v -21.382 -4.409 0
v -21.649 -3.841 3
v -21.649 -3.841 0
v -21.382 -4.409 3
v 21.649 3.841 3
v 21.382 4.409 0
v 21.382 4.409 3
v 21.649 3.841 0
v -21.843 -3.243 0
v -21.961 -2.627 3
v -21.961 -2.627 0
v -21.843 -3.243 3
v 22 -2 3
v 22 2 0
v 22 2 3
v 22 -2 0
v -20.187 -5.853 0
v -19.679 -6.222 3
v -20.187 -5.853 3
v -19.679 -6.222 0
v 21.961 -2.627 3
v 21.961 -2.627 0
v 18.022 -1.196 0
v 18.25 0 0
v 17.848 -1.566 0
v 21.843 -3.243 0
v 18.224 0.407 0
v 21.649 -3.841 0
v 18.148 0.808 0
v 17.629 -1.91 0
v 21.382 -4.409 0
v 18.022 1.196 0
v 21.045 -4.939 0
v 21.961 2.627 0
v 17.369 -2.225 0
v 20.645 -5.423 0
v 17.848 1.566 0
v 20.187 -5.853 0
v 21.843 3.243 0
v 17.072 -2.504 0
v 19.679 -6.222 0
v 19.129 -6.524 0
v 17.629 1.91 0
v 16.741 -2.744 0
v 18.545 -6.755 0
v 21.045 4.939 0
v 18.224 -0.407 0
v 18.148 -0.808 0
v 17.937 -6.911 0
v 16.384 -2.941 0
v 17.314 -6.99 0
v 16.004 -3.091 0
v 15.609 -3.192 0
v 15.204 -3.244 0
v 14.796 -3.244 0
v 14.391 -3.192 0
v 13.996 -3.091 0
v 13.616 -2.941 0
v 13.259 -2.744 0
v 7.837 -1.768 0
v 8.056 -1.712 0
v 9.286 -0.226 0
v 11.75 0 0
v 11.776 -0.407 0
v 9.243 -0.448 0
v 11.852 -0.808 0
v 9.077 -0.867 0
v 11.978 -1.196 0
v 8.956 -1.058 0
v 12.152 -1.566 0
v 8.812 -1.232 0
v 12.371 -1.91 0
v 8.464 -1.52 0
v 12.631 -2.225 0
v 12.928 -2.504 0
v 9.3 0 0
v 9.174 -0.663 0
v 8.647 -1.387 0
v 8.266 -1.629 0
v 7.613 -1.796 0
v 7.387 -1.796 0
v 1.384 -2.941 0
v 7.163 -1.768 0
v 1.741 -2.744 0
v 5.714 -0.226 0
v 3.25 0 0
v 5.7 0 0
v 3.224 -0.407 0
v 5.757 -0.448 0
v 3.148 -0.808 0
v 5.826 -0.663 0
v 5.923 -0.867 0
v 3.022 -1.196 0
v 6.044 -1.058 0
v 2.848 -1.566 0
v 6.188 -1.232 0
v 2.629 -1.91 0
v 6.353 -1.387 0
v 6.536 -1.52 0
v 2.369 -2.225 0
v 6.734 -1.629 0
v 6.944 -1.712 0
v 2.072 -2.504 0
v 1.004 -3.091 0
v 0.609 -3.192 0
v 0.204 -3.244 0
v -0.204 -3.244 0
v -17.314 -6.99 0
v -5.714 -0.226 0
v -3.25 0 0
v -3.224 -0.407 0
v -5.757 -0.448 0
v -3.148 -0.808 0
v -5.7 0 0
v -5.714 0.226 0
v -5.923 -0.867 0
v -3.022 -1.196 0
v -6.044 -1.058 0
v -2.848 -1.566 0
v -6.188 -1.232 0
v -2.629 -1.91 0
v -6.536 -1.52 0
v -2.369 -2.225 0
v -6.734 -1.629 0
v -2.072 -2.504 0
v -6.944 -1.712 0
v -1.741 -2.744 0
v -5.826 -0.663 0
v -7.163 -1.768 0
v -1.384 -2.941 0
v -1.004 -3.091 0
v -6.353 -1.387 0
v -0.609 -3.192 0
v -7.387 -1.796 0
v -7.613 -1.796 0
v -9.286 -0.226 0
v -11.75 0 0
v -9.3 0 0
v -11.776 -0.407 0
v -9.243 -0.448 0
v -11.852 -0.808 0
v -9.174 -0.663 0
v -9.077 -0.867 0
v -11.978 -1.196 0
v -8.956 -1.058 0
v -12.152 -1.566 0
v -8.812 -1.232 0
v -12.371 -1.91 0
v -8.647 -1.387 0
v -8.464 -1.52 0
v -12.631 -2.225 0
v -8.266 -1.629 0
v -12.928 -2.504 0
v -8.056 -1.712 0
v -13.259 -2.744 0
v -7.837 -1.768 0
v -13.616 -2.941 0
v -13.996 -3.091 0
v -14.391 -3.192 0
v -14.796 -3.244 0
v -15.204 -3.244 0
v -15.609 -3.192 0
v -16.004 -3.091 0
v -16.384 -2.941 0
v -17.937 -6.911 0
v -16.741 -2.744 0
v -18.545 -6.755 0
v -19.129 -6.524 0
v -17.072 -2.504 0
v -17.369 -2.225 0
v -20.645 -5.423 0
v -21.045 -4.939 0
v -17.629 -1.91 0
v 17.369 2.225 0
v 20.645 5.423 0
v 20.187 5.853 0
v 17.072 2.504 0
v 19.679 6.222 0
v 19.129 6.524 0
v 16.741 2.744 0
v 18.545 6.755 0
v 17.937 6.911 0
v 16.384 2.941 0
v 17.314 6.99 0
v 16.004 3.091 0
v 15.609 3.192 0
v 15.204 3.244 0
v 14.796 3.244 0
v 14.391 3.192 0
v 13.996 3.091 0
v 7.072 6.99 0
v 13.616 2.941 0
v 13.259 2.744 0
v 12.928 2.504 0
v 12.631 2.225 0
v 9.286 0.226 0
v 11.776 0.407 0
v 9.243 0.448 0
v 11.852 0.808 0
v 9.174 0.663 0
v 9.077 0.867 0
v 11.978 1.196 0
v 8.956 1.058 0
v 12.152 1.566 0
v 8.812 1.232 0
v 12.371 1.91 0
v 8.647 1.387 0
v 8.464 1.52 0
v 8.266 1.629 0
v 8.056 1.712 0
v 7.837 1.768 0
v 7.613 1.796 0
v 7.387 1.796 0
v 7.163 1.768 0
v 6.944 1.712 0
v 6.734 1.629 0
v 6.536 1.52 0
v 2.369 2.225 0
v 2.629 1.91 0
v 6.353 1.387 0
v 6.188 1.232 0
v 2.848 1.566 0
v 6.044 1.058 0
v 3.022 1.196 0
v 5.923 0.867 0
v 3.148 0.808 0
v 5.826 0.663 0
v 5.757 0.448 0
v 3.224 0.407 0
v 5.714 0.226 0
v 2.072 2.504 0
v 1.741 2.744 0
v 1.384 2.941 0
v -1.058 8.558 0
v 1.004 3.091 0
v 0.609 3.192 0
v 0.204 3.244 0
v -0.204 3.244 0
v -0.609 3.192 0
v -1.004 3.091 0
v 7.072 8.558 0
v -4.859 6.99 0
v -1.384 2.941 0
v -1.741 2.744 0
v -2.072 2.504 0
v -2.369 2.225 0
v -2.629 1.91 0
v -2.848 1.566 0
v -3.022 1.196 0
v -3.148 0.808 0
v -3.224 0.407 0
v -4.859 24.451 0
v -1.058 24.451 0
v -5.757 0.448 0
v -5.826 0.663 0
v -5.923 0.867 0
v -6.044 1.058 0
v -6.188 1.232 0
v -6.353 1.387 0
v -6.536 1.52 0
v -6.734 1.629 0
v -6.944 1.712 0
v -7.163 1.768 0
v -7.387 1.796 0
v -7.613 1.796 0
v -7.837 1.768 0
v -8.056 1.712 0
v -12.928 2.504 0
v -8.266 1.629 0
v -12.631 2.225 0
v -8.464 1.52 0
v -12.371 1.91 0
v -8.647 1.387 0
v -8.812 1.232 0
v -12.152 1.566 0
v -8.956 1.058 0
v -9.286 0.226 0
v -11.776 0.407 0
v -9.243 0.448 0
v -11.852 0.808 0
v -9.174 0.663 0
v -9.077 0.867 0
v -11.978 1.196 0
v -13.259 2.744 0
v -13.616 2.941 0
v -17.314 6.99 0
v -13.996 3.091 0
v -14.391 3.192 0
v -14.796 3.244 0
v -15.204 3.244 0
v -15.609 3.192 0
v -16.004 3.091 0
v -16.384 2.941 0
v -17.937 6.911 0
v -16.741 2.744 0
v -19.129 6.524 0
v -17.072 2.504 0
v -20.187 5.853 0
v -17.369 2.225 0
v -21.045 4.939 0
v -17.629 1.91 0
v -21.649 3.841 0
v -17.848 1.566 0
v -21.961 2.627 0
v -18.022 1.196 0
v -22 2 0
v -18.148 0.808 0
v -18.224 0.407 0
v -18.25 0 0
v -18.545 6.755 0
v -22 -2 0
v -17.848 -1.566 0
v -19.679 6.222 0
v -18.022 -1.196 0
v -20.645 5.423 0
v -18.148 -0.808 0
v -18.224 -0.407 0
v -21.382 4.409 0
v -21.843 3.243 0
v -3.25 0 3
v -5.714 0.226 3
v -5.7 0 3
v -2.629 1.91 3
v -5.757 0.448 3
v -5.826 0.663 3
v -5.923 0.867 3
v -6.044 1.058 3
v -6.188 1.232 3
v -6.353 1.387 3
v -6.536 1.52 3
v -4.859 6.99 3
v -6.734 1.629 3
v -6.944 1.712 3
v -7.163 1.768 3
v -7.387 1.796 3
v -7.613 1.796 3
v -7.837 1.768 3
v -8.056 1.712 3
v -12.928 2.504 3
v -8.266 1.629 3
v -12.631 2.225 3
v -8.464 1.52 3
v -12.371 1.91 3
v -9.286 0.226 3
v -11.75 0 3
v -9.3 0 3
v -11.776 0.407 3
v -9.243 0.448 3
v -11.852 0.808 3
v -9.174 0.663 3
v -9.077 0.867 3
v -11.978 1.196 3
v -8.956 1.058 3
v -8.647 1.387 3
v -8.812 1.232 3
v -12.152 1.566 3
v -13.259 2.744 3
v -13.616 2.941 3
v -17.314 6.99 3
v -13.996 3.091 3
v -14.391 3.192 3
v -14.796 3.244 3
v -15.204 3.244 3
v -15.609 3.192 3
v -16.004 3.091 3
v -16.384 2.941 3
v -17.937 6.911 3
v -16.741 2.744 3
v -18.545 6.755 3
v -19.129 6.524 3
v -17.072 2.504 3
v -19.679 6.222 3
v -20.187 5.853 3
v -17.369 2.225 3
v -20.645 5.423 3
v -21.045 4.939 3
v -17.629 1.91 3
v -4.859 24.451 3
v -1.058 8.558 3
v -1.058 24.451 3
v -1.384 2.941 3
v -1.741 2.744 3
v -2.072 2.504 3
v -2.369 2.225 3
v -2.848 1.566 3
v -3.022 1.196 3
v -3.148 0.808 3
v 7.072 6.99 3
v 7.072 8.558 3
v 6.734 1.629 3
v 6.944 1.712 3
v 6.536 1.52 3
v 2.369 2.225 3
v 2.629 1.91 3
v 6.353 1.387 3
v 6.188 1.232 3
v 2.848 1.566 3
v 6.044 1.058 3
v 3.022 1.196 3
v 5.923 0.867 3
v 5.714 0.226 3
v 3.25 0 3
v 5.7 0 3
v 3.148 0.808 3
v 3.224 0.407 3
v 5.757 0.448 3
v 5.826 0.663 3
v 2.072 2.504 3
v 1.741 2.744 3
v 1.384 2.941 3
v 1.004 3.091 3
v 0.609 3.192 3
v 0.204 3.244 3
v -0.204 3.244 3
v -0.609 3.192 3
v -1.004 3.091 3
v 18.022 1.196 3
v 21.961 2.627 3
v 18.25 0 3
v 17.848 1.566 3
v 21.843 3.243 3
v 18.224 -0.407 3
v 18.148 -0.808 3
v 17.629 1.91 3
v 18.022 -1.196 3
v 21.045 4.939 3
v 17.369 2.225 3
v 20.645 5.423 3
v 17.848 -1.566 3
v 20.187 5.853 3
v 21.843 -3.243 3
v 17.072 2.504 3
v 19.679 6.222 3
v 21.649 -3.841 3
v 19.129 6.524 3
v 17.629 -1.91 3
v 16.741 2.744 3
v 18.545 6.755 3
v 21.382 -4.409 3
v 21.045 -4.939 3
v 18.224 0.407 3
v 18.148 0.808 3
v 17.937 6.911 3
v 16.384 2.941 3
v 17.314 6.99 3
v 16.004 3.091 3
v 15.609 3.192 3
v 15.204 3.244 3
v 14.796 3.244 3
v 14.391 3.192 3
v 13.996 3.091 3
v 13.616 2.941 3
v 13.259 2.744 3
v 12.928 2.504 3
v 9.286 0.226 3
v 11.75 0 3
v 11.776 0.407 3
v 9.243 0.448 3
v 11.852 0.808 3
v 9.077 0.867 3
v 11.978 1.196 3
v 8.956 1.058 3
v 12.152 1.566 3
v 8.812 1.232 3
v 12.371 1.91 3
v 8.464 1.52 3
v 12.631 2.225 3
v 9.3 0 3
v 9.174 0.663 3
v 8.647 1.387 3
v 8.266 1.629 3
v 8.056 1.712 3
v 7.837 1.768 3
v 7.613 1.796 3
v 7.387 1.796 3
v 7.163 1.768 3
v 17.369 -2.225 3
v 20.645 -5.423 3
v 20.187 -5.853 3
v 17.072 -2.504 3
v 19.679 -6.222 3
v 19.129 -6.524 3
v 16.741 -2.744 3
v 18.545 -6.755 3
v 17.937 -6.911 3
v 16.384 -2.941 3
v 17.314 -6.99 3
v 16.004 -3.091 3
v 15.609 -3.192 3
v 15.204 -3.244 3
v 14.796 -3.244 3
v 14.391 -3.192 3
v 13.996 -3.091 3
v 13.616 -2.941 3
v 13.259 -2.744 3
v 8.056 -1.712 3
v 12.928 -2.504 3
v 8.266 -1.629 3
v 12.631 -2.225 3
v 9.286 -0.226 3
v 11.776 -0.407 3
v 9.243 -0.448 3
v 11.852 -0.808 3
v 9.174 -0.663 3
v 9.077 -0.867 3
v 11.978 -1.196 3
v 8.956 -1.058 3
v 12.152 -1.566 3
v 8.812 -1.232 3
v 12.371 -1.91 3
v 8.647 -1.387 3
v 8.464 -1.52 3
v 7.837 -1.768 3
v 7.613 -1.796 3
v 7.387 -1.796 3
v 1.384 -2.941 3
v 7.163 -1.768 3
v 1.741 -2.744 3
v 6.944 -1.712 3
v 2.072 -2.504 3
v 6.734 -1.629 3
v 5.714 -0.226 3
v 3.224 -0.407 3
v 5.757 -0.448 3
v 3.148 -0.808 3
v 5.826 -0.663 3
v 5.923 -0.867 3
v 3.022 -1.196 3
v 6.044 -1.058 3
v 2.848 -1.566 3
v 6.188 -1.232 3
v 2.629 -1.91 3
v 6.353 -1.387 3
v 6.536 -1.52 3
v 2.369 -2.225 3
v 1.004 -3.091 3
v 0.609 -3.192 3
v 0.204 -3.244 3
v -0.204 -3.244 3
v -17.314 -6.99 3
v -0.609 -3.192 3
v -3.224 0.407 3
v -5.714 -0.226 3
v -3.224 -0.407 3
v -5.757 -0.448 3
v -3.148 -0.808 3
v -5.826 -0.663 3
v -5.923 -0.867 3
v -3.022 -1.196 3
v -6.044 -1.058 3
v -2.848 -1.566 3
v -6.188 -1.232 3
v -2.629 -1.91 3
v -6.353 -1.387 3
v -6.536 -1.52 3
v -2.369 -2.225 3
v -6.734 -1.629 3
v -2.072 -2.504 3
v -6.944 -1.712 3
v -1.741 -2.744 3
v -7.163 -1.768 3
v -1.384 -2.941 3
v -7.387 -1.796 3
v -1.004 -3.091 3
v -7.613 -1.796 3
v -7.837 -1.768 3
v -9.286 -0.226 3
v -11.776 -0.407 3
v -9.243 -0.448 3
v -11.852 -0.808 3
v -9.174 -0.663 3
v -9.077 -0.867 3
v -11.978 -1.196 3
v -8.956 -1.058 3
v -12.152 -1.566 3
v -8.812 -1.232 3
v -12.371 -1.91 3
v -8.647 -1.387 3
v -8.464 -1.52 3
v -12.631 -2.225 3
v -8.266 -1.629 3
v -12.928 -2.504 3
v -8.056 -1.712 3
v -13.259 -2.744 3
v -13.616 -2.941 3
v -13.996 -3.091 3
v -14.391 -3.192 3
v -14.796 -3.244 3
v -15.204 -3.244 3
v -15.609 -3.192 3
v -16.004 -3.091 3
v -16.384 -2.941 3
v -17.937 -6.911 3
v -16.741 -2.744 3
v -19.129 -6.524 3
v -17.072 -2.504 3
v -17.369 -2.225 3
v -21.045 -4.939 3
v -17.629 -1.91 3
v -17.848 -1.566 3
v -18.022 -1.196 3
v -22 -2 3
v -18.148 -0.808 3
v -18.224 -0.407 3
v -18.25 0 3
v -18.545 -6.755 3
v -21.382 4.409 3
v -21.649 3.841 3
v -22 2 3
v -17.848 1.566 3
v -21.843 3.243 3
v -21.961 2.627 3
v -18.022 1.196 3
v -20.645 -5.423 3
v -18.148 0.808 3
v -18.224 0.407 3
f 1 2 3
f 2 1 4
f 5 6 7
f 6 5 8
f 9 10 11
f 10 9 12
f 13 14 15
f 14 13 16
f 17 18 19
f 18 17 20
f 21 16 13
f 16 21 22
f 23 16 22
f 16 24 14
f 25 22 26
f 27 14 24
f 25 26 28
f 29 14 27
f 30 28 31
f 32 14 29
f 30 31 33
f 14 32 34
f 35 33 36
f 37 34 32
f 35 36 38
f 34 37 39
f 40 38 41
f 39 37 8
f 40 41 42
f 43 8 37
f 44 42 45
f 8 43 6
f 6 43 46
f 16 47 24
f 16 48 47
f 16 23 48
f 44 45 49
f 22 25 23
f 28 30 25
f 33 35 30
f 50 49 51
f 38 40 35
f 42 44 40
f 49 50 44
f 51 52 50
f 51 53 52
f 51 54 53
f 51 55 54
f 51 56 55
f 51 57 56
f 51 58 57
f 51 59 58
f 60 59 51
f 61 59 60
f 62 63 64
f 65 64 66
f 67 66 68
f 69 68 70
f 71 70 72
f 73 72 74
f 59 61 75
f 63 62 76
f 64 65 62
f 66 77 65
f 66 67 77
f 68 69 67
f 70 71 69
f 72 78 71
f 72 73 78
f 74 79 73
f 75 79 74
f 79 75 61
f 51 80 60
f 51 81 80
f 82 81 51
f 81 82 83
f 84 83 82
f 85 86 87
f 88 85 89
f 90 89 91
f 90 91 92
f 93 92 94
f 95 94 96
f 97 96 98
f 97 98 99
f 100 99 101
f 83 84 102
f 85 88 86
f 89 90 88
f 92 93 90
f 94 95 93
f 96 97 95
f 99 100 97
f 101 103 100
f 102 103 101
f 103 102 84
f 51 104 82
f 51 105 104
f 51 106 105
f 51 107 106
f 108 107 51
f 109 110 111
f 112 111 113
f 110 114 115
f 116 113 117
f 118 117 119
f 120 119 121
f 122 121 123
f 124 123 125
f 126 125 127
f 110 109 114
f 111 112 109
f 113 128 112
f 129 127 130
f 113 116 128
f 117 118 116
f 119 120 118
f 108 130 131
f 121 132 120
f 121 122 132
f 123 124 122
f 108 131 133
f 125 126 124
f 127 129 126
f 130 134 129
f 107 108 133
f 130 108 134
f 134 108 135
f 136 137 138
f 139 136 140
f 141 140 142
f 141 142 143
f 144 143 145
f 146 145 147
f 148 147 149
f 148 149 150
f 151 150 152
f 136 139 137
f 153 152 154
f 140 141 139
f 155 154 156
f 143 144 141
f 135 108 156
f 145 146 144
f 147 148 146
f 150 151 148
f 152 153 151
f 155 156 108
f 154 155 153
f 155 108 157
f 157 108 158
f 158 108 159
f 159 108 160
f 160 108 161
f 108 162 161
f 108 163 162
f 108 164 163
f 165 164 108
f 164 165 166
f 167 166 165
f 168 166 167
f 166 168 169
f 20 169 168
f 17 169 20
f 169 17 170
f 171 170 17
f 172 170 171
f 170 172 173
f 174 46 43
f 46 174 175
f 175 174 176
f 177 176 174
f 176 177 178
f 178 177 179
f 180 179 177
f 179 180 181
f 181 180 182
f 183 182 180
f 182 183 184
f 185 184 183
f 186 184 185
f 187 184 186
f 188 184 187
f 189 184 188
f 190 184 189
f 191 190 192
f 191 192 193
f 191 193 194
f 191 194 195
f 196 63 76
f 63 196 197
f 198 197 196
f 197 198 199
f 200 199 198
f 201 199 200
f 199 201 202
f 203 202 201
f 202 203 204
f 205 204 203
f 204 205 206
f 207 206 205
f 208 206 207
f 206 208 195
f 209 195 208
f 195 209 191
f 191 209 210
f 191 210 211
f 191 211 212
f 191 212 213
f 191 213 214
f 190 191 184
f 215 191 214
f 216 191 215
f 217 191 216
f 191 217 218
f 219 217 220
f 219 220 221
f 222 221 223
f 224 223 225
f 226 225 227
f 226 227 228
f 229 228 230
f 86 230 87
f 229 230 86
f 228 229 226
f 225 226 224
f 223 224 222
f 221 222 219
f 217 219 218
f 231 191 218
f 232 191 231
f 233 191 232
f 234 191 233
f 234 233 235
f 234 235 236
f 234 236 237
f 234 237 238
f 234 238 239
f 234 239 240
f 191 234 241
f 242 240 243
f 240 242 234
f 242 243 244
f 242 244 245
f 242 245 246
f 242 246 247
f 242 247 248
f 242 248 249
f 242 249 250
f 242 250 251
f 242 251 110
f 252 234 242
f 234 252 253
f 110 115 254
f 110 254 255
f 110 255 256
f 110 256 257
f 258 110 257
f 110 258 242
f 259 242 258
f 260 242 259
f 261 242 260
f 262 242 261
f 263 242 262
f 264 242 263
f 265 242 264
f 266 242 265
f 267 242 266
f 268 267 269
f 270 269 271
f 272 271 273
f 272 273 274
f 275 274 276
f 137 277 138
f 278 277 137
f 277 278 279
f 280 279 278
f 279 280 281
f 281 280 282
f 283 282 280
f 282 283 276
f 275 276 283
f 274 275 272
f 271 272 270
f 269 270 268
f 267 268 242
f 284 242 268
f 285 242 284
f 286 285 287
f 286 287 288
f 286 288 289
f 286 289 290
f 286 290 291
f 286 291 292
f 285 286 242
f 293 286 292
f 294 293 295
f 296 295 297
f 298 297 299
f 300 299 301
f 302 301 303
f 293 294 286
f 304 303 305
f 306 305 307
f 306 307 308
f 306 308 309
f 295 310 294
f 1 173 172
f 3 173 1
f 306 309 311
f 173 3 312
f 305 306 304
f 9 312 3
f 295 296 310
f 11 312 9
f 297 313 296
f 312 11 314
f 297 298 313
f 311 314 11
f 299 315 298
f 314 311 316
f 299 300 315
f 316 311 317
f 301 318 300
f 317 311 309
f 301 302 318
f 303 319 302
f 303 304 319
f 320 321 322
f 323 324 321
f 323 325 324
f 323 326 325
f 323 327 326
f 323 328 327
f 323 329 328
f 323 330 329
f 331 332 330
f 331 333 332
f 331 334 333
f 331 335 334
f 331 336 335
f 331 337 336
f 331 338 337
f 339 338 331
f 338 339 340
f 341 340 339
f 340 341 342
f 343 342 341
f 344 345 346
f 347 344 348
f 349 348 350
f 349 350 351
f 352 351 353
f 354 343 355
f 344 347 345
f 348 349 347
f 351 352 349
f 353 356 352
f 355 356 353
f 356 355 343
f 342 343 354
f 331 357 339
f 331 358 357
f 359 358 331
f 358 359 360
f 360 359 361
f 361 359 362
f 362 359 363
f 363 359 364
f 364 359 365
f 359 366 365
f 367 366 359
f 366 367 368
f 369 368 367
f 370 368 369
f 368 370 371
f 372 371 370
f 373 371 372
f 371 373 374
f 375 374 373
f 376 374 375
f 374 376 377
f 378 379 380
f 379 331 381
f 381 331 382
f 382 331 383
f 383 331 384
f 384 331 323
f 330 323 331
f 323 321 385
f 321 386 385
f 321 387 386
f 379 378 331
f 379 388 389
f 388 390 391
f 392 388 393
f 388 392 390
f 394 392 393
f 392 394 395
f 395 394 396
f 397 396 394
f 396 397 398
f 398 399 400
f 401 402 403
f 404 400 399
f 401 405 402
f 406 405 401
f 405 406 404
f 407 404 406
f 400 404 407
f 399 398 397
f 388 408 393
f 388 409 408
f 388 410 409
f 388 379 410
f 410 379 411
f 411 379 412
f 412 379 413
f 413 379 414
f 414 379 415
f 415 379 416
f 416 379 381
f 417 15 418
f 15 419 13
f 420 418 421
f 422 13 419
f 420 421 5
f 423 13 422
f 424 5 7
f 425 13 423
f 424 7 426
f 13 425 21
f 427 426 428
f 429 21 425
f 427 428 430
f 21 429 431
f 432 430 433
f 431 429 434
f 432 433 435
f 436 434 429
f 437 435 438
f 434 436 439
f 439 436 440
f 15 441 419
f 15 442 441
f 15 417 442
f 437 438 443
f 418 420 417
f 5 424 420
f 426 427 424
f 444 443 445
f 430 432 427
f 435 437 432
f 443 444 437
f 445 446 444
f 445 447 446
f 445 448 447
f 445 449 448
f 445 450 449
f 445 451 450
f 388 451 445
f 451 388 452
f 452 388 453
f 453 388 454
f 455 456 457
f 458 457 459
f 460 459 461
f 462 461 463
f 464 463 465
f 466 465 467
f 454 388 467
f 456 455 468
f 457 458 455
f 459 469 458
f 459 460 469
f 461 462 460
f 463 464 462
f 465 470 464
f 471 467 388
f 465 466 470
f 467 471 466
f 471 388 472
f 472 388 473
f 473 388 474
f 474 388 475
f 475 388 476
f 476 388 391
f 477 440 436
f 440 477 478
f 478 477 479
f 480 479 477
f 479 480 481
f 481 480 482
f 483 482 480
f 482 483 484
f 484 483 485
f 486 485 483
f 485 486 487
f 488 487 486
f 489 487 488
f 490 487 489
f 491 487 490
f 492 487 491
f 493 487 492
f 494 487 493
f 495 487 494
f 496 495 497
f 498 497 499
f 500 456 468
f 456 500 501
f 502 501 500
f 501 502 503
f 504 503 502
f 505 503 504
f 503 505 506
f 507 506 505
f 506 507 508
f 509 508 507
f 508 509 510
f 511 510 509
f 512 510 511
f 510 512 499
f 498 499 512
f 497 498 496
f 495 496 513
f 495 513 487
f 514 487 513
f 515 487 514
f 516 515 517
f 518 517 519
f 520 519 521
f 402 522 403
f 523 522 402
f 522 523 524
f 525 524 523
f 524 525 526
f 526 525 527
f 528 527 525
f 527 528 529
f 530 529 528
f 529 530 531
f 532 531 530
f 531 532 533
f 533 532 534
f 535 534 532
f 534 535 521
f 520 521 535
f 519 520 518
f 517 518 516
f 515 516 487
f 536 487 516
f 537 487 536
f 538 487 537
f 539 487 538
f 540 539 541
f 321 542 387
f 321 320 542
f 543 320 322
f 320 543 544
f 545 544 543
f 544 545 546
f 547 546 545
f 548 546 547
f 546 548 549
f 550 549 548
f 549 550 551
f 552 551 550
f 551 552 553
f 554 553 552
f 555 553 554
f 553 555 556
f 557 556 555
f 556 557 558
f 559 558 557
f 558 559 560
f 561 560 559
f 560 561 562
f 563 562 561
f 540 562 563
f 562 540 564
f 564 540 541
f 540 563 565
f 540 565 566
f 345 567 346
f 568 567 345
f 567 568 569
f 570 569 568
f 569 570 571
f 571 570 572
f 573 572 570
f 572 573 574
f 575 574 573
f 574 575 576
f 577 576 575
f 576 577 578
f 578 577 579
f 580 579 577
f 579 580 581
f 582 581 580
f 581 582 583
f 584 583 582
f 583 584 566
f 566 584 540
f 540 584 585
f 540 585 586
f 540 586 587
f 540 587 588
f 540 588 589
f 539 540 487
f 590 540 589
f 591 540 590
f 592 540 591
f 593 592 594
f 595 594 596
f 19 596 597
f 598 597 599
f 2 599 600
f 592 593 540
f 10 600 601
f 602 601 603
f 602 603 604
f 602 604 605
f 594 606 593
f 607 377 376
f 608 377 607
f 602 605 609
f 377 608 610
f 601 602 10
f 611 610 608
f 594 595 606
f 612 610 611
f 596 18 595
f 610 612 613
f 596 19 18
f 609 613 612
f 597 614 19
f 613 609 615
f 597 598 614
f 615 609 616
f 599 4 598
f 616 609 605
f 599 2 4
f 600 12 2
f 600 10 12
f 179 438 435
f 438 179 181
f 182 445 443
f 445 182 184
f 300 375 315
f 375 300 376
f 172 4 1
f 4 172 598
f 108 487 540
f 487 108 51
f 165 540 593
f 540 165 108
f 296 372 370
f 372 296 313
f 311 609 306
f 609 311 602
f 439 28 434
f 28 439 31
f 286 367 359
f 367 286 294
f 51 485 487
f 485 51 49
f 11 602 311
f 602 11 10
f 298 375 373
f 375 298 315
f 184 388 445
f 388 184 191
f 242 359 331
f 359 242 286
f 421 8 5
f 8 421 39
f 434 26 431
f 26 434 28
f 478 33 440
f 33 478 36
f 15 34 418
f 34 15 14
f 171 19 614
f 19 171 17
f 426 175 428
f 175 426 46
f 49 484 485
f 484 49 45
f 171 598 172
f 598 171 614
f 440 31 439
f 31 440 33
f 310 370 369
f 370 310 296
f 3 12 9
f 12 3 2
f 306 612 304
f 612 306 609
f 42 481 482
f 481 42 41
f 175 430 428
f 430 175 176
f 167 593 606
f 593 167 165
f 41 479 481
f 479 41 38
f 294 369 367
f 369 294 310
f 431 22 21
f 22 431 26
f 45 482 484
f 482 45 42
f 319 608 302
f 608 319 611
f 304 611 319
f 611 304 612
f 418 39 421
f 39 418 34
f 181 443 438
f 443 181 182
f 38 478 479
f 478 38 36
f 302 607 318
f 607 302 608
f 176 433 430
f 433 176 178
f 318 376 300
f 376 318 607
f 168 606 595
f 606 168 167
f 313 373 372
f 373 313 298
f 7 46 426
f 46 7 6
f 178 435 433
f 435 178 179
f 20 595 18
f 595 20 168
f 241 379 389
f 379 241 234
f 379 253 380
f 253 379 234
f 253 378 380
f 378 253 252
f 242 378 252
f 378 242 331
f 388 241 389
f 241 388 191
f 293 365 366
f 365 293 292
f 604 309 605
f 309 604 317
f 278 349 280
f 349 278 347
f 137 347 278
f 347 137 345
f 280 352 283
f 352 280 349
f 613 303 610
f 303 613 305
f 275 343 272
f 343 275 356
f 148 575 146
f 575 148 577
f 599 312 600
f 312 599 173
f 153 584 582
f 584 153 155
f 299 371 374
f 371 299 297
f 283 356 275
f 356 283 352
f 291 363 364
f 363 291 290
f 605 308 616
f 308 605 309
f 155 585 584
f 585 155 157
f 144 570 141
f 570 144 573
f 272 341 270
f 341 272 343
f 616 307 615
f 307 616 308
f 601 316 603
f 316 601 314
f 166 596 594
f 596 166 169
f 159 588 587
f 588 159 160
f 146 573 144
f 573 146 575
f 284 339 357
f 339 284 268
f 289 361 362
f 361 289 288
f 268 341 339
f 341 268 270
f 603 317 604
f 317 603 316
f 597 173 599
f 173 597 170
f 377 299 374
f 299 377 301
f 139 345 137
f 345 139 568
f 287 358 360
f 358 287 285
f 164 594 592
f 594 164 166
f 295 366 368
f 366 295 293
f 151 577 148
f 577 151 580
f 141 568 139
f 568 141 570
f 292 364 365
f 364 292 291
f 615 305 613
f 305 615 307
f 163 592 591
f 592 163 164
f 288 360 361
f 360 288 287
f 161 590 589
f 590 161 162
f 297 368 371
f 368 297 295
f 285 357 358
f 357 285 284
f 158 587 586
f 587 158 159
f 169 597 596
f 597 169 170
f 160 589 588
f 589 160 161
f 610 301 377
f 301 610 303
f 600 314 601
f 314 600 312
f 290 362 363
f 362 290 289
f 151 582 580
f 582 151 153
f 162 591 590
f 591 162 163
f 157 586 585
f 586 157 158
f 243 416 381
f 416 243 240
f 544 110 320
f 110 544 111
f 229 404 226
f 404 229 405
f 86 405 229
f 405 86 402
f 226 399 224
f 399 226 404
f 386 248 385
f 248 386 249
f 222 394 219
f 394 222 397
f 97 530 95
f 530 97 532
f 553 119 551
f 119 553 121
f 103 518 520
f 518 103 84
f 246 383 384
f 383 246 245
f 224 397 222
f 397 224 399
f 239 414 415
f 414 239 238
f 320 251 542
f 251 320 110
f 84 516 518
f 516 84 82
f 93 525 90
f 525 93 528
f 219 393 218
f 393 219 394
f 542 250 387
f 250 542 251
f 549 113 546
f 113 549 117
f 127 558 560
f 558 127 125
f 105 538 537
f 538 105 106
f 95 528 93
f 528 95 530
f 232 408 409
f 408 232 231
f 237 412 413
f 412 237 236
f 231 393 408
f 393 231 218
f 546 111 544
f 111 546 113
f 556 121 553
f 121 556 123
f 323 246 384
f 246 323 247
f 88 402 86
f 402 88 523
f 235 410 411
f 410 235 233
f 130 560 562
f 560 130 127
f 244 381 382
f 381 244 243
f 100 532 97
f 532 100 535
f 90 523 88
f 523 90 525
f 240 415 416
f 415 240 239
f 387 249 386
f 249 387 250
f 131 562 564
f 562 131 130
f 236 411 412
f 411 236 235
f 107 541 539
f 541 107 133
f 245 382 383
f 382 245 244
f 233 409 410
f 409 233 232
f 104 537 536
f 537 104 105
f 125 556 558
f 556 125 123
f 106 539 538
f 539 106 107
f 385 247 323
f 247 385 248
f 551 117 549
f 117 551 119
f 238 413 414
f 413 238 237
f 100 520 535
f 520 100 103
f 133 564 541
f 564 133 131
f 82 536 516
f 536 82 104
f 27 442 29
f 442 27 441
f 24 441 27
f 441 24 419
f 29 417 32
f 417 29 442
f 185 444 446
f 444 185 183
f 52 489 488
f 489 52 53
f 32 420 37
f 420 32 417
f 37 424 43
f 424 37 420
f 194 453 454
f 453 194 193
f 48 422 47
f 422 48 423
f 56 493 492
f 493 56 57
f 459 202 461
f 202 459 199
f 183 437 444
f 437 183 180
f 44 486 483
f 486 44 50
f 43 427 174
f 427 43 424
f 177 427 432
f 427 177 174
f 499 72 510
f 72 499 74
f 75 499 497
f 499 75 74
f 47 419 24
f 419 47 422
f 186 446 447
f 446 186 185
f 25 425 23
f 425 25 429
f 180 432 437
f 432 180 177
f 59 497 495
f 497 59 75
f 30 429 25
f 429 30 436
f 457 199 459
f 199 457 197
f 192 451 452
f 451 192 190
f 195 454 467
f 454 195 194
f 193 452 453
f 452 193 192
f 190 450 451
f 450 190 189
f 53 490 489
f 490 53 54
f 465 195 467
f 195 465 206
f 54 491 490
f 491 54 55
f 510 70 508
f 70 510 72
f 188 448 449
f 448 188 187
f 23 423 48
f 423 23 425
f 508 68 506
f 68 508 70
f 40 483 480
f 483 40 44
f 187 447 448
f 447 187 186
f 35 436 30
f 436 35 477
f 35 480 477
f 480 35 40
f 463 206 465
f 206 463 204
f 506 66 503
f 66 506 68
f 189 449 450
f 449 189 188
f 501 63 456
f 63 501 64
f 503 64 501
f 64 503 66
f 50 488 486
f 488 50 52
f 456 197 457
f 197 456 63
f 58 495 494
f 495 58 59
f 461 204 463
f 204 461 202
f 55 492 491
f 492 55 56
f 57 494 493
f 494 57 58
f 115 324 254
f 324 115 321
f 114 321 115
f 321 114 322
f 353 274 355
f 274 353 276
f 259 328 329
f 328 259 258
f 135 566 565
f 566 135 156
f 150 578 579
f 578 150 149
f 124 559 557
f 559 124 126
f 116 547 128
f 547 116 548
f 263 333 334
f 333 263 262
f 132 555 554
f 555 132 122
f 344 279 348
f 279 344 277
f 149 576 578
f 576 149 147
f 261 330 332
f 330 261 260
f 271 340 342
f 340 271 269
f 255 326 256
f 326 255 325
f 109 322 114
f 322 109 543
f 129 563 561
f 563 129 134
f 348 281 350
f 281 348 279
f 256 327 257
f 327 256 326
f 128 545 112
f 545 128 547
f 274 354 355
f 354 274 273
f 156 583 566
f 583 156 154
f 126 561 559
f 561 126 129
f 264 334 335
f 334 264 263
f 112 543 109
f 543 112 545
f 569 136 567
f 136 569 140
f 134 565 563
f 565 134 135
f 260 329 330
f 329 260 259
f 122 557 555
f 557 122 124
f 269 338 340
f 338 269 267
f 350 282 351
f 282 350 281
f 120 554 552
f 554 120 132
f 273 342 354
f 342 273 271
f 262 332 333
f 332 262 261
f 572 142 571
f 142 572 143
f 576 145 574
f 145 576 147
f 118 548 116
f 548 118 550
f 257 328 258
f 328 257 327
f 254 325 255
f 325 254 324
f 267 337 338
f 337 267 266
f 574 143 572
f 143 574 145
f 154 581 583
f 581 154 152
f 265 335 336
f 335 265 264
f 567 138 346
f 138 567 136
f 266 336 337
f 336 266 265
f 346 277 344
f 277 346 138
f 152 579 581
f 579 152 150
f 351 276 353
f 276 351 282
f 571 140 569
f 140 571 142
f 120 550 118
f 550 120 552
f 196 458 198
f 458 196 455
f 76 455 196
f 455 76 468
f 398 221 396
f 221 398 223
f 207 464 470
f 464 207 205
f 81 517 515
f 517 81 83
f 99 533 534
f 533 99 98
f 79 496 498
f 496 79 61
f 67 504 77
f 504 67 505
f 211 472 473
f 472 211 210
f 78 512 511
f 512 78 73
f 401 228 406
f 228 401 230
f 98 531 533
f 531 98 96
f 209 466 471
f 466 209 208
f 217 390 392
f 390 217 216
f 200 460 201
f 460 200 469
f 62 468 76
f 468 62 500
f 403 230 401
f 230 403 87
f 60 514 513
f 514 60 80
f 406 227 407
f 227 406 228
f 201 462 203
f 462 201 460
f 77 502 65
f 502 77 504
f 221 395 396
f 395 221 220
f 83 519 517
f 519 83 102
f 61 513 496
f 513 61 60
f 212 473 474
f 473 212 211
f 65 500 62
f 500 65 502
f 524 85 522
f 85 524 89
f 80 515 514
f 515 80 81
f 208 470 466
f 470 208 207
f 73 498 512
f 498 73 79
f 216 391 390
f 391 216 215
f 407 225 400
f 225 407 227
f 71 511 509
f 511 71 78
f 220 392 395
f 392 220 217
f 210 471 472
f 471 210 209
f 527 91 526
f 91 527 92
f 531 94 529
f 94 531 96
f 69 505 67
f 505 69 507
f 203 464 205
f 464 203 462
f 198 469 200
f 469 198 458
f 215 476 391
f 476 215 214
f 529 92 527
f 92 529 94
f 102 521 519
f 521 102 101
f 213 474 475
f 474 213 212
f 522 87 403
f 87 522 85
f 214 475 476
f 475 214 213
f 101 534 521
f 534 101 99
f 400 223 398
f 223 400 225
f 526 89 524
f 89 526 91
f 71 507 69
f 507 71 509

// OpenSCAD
$fn = 50;


difference() {
	union() {
		hull() {
			translate(v = [-17.0000000000, 2.0000000000, 0]) {
				cylinder(h = 3, r = 5);
			}
			translate(v = [17.0000000000, 2.0000000000, 0]) {
				cylinder(h = 3, r = 5);
			}
			translate(v = [-17.0000000000, -2.0000000000, 0]) {
				cylinder(h = 3, r = 5);
			}
			translate(v = [17.0000000000, -2.0000000000, 0]) {
				cylinder(h = 3, r = 5);
			}
		}
		translate(v = [0, 24, 0]) {
			linear_extrude(height = 3) {
				text(font = "DejaVu Sans Mono:style=Bold", halign = "center", size = 19.0000000000, text = "L", valign = "top");
			}
		}
	}
	union() {
		translate(v = [-15.0000000000, 0.0000000000, 0]) {
			translate(v = [0, 0, -100]) {
				cylinder(h = 200, r = 3.2500000000);
			}
		}
		translate(v = [0, 0, -100]) {
			cylinder(h = 200, r = 3.2500000000);
		}
		translate(v = [15.0000000000, 0.0000000000, 0]) {
			translate(v = [0, 0, -100]) {
				cylinder(h = 200, r = 3.2500000000);
			}
		}
		translate(v = [-15.0000000000, 0.0000000000, 0]) {
			translate(v = [0, 0, -100]) {
				cylinder(h = 200, r = 1.8000000000);
			}
		}
		translate(v = [-7.5000000000, 0.0000000000, 0]) {
			translate(v = [0, 0, -100]) {
				cylinder(h = 200, r = 1.8000000000);
			}
		}
		translate(v = [0, 0, -100]) {
			cylinder(h = 200, r = 1.8000000000);
		}
		translate(v = [7.5000000000, 0.0000000000, 0]) {
			translate(v = [0, 0, -100]) {
				cylinder(h = 200, r = 1.8000000000);
			}
		}
		translate(v = [15.0000000000, 0.0000000000, 0]) {
			translate(v = [0, 0, -100]) {
				cylinder(h = 200, r = 1.8000000000);
			}
		}
	}
}
